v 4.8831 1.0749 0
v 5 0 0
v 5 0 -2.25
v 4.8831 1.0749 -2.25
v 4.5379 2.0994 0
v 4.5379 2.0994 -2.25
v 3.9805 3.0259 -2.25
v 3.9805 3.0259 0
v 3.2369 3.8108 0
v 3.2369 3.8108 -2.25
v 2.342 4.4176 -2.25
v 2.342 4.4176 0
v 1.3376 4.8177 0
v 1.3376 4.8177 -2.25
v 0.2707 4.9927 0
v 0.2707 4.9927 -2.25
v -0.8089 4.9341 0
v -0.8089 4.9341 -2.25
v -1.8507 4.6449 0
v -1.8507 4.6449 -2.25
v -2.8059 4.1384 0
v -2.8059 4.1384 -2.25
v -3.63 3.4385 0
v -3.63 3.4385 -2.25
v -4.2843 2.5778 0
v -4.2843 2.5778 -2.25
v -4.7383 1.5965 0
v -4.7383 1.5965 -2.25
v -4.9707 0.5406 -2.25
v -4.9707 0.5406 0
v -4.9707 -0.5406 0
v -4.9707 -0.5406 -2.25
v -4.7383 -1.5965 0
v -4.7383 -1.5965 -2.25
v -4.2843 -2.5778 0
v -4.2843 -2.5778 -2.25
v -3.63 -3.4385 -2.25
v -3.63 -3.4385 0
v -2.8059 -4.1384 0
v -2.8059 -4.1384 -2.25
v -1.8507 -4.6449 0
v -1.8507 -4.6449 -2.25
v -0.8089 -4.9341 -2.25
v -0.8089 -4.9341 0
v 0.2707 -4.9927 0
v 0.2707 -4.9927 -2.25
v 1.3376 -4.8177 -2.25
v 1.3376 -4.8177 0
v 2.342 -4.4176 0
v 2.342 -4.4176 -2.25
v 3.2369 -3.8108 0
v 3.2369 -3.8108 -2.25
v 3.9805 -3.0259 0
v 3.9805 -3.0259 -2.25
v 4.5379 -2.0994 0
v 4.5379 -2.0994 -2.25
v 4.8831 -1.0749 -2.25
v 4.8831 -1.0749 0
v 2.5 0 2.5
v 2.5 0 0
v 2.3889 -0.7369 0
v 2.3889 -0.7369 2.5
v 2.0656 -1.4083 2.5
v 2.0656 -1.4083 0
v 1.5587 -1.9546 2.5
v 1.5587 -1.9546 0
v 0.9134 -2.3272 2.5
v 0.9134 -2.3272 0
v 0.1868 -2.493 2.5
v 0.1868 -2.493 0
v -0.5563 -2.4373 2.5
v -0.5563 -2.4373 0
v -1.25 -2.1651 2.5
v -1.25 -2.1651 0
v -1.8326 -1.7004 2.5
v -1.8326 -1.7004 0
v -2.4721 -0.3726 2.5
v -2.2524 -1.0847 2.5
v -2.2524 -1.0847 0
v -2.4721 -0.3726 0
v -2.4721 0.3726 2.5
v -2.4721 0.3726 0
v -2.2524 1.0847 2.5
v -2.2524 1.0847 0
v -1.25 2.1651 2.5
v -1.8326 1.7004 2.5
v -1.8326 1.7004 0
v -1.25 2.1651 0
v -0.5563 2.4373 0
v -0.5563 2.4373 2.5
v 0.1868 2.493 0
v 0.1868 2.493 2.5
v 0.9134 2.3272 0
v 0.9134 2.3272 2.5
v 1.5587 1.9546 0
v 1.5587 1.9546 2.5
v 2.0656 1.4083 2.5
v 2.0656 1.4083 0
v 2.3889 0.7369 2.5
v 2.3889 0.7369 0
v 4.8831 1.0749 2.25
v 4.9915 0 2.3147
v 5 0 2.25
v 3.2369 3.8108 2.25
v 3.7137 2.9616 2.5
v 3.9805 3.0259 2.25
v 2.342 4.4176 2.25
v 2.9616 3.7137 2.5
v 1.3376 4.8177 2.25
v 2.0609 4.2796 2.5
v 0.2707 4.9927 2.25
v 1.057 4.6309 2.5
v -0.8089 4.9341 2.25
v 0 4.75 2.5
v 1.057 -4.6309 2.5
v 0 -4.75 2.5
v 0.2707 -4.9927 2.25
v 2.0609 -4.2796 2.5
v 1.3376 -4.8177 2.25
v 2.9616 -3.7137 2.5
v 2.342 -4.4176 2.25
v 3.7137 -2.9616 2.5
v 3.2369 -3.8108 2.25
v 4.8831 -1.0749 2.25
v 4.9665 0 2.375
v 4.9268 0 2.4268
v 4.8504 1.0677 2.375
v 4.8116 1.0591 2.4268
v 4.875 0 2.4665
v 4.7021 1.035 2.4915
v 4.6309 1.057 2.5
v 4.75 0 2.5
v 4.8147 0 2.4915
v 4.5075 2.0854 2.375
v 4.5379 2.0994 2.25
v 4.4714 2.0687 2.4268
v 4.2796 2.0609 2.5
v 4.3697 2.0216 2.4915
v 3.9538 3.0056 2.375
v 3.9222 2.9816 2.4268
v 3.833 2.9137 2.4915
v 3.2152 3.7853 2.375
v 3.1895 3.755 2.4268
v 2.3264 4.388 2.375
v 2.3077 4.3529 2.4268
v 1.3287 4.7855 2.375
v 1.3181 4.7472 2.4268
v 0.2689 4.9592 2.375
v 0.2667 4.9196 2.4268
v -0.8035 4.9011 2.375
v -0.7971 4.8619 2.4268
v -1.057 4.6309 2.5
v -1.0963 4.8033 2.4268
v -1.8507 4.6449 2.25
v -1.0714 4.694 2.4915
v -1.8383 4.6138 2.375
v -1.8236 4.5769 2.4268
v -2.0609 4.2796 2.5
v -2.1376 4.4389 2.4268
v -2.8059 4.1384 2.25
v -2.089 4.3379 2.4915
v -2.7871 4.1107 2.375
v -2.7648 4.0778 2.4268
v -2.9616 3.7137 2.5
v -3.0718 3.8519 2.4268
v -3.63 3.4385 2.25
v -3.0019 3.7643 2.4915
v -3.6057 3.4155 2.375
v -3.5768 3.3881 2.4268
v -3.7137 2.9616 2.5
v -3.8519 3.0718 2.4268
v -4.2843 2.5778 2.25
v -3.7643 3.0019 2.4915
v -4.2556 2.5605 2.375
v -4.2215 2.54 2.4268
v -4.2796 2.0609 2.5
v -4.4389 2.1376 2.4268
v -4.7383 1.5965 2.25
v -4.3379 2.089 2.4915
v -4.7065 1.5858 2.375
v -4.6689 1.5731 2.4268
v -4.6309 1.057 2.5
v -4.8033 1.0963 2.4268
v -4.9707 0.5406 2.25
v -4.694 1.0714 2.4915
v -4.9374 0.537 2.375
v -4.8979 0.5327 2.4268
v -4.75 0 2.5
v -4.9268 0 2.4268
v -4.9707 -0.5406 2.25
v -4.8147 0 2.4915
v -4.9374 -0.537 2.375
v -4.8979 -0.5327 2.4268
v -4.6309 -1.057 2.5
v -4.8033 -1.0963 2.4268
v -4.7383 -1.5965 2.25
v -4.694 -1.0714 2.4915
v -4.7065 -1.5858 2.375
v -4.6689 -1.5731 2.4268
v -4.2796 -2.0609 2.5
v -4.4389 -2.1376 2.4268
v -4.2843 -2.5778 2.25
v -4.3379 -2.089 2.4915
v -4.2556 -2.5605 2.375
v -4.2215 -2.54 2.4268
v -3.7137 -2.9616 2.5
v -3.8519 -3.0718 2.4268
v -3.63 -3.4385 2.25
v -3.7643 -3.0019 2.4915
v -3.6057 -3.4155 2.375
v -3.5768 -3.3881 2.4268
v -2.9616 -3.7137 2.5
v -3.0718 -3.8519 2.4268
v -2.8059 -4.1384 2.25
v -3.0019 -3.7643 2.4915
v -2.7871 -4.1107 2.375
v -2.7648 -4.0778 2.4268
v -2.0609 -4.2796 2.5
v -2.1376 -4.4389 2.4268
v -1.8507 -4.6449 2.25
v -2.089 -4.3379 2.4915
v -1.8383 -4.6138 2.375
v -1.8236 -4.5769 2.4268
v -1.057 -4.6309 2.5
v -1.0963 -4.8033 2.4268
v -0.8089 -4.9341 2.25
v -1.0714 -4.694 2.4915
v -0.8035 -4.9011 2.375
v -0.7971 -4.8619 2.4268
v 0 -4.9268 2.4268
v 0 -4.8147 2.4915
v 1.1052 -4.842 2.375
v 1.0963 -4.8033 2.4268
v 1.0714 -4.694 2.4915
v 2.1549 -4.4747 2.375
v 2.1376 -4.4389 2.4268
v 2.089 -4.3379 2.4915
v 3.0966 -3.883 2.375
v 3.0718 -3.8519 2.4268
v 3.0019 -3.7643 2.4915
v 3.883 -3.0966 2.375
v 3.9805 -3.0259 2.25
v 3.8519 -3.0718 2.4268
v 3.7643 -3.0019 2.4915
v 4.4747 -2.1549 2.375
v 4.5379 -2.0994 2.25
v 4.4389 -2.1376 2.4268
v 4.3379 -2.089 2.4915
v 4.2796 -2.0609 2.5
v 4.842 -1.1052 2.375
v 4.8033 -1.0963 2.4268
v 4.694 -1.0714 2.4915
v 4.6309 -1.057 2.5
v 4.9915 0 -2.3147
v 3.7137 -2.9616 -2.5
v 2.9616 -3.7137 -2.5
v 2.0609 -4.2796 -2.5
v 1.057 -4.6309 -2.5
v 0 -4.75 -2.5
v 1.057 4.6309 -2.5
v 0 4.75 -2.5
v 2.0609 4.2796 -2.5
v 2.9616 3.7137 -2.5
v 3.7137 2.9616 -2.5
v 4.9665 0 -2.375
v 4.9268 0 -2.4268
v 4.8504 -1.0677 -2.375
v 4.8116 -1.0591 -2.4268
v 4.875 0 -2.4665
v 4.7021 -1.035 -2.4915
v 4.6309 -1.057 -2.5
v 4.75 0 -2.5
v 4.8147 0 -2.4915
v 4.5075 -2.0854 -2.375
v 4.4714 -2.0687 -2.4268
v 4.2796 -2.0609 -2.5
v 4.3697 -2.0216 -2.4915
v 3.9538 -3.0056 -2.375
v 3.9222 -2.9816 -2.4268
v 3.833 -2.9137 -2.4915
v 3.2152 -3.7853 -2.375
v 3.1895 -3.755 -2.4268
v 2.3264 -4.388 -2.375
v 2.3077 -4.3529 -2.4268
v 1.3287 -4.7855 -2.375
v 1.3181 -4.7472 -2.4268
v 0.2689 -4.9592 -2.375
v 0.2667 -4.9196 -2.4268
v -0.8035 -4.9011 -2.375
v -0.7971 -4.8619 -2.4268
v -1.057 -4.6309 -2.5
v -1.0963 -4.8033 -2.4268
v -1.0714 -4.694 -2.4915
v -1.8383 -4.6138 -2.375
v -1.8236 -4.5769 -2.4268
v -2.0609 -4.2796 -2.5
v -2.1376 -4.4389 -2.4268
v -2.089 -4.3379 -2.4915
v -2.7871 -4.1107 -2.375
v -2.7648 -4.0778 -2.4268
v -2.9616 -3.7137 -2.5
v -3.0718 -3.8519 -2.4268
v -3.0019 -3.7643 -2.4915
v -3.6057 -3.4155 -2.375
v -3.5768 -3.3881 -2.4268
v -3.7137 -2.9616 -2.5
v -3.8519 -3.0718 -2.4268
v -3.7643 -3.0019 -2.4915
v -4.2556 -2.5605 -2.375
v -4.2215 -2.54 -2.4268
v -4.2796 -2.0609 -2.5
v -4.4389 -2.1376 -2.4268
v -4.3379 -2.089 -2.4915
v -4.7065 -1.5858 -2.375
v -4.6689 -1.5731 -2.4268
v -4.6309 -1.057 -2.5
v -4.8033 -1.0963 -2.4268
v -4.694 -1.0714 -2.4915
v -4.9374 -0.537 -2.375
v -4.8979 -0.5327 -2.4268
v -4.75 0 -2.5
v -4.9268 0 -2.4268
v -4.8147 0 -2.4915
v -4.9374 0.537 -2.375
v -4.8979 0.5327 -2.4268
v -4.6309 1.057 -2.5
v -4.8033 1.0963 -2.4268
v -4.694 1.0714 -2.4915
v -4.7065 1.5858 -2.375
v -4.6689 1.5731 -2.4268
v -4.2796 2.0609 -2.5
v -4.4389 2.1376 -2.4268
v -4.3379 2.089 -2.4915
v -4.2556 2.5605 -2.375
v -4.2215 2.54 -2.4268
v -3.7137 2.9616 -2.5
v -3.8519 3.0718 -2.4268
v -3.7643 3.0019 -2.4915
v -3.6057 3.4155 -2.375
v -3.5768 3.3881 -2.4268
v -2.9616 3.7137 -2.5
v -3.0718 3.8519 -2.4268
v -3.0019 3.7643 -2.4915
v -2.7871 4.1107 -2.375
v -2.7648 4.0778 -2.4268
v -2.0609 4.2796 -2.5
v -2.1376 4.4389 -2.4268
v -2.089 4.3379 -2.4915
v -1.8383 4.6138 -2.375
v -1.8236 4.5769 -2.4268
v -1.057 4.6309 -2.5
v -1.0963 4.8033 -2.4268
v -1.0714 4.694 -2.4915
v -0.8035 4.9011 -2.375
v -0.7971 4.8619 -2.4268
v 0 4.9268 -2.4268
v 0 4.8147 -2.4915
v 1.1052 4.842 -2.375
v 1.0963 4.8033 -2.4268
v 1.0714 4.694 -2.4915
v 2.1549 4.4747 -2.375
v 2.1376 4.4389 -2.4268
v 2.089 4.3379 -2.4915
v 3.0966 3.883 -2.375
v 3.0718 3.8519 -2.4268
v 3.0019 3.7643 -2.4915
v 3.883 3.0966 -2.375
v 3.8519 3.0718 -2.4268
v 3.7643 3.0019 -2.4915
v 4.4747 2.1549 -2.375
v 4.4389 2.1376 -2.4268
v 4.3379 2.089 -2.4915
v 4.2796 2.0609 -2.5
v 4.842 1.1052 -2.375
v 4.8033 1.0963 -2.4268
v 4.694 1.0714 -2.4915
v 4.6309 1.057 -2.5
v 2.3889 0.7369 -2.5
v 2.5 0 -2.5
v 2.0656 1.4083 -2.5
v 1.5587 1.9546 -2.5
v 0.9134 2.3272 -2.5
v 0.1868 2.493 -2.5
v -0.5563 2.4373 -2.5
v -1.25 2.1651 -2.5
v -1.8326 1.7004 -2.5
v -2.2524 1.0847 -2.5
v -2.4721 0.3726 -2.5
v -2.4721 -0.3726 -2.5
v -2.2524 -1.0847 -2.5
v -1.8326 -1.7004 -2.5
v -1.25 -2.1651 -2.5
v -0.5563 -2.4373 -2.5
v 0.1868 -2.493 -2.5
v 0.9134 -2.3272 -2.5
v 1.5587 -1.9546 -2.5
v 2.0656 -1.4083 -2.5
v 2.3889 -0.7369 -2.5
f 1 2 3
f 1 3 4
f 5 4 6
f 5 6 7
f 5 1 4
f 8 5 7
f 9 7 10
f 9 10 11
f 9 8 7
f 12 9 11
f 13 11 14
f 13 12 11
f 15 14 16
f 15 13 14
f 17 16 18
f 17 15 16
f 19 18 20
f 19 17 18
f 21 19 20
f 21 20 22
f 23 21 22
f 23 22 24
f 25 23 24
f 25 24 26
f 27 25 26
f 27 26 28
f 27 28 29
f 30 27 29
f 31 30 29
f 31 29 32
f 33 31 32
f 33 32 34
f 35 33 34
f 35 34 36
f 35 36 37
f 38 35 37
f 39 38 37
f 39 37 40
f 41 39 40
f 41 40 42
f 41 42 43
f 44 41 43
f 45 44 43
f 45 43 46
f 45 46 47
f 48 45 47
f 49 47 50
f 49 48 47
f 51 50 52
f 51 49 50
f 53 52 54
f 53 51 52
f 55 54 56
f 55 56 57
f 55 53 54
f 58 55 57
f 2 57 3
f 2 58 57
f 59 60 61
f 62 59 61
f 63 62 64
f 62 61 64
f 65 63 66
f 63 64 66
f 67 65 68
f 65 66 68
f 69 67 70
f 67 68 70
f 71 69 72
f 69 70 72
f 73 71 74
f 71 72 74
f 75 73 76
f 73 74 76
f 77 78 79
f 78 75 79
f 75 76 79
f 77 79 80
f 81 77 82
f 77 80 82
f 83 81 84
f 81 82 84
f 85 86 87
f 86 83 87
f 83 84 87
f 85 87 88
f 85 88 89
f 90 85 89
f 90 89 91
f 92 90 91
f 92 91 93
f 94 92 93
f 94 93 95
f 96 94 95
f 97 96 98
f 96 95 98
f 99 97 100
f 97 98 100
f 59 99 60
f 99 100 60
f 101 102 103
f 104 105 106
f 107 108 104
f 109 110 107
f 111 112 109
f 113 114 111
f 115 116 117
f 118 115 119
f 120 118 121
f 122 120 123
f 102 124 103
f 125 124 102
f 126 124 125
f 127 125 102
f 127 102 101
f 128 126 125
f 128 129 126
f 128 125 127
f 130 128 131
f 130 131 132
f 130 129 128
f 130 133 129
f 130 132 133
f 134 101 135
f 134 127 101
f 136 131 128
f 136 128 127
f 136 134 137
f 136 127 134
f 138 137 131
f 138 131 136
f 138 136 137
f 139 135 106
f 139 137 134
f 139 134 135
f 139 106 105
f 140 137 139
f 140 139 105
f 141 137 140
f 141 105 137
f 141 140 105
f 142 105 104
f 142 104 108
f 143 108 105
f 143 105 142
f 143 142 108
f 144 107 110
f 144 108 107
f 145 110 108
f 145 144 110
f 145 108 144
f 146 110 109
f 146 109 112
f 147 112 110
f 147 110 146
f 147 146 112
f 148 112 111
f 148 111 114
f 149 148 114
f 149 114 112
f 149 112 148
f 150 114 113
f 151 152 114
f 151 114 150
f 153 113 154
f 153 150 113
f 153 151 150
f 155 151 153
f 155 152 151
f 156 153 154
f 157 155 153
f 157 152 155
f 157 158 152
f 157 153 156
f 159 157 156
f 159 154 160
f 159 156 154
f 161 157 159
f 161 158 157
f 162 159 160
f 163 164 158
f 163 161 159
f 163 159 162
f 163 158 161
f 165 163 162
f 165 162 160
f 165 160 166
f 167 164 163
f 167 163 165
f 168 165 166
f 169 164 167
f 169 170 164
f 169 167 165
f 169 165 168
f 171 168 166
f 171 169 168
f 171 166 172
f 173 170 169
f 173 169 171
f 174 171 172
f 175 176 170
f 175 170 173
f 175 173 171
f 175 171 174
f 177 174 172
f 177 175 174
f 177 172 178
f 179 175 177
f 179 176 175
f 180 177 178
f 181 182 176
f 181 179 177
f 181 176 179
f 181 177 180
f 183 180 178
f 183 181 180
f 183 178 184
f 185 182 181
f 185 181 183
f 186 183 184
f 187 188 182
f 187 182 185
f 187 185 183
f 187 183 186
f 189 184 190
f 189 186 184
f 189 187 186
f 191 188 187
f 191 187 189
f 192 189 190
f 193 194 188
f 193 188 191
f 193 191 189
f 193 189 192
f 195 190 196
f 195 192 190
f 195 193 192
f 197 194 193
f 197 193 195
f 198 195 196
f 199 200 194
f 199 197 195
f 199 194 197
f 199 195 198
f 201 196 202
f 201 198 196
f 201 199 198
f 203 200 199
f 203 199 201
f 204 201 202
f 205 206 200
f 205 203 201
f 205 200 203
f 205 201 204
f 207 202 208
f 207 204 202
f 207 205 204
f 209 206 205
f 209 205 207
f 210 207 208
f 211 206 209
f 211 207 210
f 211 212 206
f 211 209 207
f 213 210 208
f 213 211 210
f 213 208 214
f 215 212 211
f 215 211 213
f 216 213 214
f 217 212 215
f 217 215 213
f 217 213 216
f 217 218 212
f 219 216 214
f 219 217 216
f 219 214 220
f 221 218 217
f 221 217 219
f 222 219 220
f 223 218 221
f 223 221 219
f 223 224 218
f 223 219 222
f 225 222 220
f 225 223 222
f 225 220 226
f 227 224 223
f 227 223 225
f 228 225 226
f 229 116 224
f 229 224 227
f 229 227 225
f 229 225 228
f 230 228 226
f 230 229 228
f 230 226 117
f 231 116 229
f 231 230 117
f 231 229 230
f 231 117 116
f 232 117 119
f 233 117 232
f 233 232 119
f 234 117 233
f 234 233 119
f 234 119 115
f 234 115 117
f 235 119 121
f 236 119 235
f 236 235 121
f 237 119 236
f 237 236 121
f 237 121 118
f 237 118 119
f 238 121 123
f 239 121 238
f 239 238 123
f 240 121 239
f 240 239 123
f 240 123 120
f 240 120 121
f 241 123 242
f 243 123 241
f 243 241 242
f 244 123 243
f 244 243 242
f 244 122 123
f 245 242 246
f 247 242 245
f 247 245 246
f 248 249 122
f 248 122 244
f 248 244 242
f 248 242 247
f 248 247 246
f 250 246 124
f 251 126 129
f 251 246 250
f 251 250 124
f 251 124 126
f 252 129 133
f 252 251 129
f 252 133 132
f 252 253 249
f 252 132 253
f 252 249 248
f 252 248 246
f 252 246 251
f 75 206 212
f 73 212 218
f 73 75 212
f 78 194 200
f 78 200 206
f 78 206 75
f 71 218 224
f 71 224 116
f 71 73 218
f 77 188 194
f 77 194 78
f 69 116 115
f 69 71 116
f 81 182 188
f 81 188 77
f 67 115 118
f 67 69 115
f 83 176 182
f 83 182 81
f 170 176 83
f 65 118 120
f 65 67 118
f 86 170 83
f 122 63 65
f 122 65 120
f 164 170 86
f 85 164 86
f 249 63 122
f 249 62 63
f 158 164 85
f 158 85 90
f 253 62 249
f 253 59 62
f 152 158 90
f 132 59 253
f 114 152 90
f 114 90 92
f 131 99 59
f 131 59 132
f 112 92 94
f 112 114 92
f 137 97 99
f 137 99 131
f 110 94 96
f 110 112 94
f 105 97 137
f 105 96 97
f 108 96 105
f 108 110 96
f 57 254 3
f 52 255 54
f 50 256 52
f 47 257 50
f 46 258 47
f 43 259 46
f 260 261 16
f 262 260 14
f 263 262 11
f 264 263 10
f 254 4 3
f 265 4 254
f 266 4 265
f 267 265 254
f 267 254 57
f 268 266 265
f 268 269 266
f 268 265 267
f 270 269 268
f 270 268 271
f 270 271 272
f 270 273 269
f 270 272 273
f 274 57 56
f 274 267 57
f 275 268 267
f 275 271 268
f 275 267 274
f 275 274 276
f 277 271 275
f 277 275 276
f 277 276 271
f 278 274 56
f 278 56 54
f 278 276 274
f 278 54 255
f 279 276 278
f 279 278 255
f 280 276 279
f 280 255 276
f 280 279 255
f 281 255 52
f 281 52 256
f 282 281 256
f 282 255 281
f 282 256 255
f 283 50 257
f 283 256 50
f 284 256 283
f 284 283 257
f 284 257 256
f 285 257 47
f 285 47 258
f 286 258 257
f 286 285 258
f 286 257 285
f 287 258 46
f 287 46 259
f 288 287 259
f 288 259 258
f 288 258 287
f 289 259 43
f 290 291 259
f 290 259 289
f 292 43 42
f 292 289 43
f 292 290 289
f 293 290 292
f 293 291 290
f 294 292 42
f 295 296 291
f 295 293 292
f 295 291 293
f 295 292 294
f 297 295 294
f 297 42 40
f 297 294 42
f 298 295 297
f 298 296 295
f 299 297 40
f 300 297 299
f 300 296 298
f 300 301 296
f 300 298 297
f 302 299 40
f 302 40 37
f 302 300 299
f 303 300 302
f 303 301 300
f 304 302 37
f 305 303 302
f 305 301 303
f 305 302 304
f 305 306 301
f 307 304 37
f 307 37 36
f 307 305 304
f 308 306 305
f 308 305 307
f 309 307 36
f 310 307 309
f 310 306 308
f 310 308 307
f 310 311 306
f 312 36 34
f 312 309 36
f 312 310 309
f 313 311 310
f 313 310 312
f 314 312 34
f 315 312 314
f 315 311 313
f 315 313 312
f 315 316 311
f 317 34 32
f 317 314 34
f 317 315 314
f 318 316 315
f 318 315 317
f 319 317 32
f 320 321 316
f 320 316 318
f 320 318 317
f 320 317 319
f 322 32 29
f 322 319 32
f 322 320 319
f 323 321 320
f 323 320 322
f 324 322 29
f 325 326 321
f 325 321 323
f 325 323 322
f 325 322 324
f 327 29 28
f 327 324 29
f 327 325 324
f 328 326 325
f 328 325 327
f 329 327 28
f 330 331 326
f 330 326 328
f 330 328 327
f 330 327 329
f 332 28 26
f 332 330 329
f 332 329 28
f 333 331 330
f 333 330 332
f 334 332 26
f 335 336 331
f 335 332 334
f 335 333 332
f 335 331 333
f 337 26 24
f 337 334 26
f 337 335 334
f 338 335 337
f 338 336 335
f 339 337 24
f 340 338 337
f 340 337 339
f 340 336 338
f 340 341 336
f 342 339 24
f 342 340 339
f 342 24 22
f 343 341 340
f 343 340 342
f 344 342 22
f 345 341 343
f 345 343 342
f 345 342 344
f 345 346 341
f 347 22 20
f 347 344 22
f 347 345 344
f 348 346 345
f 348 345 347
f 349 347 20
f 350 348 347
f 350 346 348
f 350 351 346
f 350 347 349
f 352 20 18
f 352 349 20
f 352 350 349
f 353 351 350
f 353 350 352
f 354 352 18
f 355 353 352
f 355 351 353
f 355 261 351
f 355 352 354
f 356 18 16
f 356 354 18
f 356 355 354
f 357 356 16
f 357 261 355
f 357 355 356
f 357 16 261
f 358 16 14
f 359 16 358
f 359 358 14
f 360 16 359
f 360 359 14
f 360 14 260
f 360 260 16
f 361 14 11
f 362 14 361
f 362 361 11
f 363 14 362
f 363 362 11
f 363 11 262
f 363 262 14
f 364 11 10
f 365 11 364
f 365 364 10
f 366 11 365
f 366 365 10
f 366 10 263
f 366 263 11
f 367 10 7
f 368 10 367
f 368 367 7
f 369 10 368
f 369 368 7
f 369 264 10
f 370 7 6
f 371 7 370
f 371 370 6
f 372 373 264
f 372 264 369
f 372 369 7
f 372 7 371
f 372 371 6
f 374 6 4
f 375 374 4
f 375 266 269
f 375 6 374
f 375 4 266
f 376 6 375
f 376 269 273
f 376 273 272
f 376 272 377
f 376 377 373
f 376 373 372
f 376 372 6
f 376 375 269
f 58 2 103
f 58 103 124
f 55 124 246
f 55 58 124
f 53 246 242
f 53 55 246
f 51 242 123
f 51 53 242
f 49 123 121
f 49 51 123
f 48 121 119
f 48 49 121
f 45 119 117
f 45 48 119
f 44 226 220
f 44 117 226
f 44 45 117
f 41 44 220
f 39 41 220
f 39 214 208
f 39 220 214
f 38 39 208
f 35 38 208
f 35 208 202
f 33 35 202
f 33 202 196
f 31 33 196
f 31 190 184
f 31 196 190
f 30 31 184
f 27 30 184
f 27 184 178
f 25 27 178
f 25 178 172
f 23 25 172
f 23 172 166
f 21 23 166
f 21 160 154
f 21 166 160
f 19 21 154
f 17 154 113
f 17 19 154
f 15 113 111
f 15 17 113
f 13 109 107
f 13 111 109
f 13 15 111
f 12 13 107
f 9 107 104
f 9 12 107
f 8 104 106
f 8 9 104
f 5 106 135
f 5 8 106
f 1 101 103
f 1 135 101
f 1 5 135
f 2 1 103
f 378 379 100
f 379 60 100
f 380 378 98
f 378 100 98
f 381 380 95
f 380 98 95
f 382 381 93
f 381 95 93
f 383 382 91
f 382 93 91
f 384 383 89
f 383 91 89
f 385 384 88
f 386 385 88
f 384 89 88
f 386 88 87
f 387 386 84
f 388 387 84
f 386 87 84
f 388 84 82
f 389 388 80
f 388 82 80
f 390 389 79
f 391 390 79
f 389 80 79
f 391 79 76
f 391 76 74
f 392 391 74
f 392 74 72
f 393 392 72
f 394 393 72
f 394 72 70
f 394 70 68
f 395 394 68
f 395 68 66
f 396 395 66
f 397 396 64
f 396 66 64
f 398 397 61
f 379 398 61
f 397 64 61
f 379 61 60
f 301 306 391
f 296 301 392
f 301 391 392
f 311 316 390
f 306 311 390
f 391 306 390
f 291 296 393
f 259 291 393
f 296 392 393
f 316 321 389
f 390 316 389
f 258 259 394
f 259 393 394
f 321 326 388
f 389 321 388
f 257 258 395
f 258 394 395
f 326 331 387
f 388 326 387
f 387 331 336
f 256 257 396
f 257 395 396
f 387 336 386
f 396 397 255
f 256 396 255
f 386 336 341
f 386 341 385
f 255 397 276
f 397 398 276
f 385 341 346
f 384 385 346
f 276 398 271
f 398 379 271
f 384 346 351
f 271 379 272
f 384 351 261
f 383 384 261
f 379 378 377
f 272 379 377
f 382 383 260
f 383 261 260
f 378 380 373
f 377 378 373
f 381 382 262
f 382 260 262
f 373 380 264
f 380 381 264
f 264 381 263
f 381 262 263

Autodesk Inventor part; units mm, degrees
ref_plane "YZ Plane" through (0, 0, 0) normal (1, 0, 0) x (0, 1, 0)
ref_plane "XZ Plane" through (0, 0, 0) normal (0, 1, 0) x (-1, 0, 0)
ref_plane "XY Plane" through (0, 0, 0) normal (0, 0, 1) x (1, 0, 0)
sketch "Szkic1" plane through (0, 0, 0) normal (0, 0, 1) x (1, 0, 0)
  circle A0 centre (0, 0) radius 2.5
  circle A1 centre (0, 0) radius 5
  dimension "d0" = 5
  dimension "d1" = 10
extrude "Wyciągnięcie proste1" add sketch "Szkic1" along normal mid plane 5
fillet "Zaokrąglenie1" radius 0.25 2 edges at (-5, 0, 2.5) (-5, 0, -2.5)
properties part number "magnes-N35H" material "Magnez"
